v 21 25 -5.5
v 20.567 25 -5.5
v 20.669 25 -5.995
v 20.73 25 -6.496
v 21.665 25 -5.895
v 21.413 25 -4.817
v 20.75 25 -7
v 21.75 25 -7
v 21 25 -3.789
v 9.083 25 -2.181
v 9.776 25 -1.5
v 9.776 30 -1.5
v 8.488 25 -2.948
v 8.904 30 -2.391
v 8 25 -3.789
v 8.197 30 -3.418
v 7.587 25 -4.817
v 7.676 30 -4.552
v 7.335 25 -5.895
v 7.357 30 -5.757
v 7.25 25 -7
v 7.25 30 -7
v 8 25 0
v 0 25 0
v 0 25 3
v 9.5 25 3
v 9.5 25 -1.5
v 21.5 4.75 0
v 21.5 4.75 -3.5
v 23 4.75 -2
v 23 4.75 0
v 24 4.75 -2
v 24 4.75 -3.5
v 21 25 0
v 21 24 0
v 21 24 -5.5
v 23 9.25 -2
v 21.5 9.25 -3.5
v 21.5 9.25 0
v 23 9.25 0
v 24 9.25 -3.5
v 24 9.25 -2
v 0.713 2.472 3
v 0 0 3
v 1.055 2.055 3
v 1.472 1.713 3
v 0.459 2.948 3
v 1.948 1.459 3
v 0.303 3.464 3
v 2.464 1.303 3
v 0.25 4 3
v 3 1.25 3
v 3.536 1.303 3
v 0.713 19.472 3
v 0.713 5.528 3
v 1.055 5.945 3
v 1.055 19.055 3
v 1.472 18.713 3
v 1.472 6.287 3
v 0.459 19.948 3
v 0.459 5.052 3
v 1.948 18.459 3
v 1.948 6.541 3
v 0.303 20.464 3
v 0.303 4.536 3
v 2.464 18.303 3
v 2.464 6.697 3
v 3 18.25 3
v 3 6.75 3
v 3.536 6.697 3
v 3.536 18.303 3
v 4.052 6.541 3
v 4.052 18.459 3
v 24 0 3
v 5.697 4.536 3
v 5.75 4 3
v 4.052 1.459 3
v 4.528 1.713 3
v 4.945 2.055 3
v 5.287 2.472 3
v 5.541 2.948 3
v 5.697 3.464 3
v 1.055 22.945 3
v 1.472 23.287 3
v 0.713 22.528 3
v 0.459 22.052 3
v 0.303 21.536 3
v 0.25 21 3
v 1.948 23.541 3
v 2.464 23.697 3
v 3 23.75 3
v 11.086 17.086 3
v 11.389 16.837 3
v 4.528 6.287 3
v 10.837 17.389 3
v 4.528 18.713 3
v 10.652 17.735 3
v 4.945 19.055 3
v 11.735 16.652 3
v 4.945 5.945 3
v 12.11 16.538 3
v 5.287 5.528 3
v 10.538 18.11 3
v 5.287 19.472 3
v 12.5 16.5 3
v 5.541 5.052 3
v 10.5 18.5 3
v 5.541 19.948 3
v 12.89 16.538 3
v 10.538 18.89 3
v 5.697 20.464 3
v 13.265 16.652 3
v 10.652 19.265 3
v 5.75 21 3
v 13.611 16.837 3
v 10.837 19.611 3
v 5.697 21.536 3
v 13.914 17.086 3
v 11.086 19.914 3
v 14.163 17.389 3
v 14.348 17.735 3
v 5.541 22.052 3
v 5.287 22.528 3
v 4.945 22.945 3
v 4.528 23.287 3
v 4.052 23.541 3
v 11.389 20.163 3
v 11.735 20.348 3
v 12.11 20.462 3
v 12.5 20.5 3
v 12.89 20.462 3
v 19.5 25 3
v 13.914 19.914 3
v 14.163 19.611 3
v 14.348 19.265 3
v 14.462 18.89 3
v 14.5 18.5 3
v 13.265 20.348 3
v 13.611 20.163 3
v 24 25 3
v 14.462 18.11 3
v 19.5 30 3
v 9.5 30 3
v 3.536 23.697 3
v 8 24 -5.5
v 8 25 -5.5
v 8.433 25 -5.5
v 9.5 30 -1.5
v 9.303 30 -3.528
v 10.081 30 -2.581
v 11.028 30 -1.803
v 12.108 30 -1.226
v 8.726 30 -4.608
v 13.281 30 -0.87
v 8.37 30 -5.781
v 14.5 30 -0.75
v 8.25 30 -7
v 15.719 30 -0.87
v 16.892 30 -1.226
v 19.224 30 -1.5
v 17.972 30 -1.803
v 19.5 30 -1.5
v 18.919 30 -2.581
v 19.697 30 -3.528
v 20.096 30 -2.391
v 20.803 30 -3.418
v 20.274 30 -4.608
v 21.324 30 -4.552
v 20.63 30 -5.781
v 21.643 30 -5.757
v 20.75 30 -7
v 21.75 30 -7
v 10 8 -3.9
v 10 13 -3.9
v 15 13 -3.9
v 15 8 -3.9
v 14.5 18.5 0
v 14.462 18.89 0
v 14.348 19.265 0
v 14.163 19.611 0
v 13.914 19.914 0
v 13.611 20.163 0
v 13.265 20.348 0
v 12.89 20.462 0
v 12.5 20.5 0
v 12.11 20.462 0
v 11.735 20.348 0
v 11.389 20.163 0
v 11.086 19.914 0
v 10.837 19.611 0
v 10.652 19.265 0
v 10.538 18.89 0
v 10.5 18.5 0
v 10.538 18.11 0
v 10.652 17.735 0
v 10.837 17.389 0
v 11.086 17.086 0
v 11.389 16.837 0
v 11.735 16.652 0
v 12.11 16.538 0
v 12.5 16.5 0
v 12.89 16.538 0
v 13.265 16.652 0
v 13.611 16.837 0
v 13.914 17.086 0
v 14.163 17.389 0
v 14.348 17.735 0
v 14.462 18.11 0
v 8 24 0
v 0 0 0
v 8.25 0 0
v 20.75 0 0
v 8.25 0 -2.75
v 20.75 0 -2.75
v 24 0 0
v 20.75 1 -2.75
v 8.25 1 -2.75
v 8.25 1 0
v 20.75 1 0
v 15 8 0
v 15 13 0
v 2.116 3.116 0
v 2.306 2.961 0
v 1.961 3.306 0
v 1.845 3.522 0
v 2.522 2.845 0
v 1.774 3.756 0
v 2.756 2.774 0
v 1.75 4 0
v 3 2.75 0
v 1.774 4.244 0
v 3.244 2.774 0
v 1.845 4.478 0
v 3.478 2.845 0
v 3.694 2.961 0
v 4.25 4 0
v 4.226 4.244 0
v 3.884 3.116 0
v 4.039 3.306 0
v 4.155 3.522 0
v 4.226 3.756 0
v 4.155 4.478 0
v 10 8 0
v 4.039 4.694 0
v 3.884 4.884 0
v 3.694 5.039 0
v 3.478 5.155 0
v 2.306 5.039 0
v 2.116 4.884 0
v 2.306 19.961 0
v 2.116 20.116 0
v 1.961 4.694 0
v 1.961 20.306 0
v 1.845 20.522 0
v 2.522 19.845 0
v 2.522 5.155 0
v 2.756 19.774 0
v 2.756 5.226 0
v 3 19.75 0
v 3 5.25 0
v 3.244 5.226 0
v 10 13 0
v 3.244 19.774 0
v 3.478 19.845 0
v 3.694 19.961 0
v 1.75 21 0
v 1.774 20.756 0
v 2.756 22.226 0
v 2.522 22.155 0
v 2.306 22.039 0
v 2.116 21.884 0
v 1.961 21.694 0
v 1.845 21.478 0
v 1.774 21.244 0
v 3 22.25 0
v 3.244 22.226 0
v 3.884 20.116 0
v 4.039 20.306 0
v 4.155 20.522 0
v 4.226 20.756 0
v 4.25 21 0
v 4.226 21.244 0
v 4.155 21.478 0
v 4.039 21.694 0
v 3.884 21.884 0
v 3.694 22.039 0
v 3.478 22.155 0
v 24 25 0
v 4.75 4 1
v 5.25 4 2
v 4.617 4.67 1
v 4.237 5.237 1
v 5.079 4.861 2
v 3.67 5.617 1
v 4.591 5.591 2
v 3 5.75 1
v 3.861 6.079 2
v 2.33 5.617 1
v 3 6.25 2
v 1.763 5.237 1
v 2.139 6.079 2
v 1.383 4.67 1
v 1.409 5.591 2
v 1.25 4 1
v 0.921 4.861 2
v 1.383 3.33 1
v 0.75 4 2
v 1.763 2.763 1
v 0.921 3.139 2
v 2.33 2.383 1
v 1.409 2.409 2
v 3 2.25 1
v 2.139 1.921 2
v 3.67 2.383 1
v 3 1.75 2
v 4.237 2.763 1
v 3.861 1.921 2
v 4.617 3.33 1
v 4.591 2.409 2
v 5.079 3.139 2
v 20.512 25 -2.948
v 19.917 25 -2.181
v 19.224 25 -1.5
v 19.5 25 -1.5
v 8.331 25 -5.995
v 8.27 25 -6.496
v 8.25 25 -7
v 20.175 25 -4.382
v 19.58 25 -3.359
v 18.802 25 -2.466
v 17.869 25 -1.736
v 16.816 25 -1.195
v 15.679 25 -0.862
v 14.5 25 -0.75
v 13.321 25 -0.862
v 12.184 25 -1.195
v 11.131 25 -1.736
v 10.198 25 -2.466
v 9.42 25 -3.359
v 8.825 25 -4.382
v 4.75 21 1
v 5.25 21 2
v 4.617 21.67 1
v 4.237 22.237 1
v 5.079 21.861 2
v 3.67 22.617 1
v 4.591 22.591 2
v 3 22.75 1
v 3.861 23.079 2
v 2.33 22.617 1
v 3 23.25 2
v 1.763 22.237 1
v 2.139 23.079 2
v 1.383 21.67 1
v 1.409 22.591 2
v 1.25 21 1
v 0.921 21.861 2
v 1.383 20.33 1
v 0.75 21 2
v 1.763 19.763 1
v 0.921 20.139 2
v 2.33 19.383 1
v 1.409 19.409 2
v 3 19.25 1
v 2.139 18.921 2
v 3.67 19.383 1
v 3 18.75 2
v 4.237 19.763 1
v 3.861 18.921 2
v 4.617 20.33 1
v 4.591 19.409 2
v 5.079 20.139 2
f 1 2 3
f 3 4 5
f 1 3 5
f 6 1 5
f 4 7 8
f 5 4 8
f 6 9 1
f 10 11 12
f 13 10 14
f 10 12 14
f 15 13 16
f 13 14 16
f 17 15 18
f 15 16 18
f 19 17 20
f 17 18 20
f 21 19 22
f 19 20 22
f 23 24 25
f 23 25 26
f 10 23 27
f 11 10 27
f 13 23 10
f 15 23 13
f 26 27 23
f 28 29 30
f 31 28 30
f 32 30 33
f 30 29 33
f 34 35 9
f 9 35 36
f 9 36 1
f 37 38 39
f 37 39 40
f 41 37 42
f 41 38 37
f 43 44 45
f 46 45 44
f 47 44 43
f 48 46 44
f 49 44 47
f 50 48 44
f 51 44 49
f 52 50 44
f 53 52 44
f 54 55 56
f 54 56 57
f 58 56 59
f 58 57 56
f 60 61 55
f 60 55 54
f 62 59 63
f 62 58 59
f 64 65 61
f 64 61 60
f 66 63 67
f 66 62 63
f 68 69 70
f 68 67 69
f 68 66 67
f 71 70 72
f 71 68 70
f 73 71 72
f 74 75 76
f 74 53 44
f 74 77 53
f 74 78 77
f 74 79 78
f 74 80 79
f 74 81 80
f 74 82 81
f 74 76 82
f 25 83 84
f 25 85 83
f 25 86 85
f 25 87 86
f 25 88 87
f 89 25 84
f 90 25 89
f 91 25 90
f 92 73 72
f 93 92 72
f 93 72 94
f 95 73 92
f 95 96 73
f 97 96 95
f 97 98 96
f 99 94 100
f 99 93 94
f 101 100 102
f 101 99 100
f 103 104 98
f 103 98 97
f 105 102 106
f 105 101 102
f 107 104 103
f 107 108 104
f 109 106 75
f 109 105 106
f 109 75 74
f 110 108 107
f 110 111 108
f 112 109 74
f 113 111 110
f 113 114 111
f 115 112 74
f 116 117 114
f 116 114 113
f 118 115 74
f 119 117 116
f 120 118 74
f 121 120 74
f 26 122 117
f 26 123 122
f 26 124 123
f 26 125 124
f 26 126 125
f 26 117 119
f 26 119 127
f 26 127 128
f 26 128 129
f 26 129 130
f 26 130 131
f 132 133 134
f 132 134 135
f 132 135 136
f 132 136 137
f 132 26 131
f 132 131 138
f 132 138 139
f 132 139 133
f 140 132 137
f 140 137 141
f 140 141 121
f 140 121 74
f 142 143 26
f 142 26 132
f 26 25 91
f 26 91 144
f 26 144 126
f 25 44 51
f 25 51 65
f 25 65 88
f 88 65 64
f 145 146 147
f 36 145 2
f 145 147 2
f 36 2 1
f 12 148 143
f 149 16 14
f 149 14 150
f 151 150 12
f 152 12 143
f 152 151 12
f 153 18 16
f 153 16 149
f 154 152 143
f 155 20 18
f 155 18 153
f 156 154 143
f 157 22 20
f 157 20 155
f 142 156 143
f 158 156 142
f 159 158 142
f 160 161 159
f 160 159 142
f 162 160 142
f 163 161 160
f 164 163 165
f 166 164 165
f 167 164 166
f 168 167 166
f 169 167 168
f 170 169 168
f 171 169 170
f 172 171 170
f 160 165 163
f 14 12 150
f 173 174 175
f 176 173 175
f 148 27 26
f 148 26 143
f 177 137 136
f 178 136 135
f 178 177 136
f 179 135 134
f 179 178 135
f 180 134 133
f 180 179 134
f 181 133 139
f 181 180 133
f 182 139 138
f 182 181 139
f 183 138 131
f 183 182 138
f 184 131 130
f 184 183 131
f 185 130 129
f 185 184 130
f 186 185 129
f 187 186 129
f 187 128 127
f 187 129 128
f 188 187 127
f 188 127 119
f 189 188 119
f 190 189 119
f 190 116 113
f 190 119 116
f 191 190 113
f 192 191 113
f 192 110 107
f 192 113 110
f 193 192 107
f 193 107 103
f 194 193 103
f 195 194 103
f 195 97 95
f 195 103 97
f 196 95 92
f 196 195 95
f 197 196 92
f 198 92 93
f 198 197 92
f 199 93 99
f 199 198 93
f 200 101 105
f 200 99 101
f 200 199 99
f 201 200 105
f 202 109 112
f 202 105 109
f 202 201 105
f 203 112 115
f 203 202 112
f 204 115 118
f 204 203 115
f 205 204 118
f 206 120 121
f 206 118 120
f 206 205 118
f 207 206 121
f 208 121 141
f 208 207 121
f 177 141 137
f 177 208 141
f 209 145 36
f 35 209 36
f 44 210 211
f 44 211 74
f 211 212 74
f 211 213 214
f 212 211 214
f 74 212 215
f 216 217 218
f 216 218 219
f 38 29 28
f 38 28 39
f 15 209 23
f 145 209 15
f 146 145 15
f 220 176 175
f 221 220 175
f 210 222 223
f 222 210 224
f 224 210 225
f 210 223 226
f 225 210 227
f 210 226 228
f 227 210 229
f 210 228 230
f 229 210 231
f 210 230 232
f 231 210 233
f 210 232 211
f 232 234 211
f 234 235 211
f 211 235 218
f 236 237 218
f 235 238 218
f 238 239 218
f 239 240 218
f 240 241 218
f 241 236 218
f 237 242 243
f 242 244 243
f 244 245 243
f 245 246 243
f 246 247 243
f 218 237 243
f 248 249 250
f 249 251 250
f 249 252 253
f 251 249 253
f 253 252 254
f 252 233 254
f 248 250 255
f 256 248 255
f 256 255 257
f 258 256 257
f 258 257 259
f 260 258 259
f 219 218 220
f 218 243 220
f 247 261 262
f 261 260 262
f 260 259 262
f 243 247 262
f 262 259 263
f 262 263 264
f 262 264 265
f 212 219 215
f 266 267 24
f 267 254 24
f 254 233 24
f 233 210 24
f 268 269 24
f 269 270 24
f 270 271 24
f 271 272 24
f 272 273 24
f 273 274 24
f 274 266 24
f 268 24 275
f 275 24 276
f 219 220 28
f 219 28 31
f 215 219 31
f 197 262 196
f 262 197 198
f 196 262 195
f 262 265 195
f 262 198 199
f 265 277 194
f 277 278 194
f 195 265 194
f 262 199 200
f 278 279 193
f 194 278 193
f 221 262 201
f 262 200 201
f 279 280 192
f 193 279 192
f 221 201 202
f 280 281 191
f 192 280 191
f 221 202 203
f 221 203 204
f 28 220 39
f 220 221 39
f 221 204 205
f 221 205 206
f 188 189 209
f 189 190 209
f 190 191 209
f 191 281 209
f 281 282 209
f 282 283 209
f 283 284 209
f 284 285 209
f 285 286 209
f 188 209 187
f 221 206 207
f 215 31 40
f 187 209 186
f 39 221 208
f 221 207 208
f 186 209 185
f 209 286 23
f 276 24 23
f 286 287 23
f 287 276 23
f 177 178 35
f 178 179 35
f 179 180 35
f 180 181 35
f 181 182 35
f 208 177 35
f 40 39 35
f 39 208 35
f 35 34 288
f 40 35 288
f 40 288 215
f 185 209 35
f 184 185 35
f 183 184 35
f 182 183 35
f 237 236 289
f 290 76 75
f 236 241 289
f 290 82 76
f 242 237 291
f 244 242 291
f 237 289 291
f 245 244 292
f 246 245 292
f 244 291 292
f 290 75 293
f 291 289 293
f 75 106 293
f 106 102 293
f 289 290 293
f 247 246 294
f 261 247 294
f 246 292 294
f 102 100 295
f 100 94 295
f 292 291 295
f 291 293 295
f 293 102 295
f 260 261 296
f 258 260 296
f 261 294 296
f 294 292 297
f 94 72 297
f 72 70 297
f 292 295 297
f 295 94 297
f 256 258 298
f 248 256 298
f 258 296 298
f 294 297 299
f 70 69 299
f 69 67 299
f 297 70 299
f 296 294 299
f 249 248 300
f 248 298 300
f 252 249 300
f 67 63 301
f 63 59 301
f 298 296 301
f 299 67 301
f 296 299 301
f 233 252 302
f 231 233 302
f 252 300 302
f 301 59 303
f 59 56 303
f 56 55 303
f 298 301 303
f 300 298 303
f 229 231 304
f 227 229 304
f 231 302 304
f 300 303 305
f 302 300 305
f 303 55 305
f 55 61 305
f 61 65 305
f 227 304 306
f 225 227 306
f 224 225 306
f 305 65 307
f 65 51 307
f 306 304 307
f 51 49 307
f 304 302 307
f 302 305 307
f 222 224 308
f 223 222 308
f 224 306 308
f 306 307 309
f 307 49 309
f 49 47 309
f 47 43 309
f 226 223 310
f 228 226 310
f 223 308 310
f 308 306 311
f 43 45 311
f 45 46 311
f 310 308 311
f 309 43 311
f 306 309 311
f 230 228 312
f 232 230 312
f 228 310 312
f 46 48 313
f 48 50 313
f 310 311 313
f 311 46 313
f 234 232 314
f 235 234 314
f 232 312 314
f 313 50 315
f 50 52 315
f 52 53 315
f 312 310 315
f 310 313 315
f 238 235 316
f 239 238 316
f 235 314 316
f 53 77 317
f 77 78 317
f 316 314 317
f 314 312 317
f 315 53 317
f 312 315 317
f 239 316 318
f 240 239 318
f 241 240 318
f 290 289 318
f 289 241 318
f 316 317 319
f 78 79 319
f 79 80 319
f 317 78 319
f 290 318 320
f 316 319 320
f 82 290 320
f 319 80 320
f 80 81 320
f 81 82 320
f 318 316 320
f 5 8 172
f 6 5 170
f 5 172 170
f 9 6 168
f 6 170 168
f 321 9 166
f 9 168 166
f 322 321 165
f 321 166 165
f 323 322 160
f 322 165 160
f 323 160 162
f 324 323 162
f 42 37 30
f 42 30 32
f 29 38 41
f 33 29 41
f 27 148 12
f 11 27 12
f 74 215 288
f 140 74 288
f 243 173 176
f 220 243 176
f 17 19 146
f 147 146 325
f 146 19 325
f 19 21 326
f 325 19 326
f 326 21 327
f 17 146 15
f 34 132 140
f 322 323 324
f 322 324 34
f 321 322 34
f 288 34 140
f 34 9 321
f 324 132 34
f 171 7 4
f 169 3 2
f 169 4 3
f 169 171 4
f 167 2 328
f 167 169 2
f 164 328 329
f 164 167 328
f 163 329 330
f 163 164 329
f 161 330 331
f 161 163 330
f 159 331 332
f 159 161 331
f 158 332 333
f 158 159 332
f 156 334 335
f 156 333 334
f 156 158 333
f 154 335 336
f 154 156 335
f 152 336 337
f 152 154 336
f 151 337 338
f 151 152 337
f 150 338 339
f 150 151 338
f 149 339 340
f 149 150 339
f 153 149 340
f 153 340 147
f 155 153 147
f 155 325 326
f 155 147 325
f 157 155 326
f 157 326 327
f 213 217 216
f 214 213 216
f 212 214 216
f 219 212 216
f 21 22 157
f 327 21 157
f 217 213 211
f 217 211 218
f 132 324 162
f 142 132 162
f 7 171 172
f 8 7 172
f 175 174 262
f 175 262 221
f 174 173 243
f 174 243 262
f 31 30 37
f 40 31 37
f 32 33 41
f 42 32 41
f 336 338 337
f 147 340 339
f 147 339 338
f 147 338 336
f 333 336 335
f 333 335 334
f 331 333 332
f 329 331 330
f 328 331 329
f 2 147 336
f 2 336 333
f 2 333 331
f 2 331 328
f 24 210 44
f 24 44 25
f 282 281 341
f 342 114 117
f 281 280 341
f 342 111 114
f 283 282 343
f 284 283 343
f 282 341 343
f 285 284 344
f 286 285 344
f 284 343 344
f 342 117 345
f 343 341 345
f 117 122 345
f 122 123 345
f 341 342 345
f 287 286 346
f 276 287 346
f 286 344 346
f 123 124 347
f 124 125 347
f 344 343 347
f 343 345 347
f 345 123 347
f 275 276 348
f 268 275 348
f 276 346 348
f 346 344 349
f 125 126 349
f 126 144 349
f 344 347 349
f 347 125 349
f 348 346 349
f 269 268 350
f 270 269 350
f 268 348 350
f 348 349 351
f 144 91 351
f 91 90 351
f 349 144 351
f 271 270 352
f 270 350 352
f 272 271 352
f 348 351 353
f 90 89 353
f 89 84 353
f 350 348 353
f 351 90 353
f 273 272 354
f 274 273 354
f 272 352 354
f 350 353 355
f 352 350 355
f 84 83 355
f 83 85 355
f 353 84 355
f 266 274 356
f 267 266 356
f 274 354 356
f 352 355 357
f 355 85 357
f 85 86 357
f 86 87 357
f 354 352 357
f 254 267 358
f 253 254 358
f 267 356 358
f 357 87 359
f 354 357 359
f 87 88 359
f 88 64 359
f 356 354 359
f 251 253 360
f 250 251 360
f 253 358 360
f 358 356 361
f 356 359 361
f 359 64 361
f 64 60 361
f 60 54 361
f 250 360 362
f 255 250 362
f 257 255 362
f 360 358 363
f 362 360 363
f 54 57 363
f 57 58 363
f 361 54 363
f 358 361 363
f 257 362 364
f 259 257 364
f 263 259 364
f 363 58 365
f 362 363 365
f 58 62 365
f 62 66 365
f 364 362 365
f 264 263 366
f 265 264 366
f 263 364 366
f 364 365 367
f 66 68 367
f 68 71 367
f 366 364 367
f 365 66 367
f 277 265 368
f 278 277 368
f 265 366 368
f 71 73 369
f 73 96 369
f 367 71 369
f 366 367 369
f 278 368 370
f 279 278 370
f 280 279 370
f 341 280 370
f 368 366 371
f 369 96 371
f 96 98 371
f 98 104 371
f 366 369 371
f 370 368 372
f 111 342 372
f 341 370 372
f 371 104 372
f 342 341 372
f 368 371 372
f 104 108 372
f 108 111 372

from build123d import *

# Parameters (mm, degrees)
BOX006_W          = 5
BOX006_H          = 5
BOX006_DEPTH      = 3.9
CYLINDER003_R     = 2
CYLINDER003_DEPTH = 10
CYLINDER002_R     = 6.25
CYLINDER002_DEPTH = 10
BOX004_W          = 10
BOX004_H          = 5
BOX004_DEPTH      = 4.5
BOX003_W          = 20
BOX003_H          = 10
BOX003_DEPTH      = 10
CYLINDER001_R     = 6.25
CYLINDER001_DEPTH = 5
CYLINDER_R        = 7.25
CYLINDER_DEPTH    = 5
BOX_W             = 24
BOX_H             = 25
BOX_DEPTH         = 3
BOX001_W          = 1.5
BOX001_H          = 4.5
BOX001_DEPTH      = 5
BOX002_W          = 2.5
BOX002_H          = 4.5
BOX002_DEPTH      = 1.5
BOX005_W          = 13
BOX005_H          = 1
BOX005_DEPTH      = 5.5
BOX007_W          = 12.5
BOX007_H          = 1
BOX007_DEPTH      = 2.75


with BuildPart() as cube006:
    # Box006 → Box006 (new body)
    with BuildSketch(Plane(origin=(10, 8, -3.9), x_dir=(1, 0, 0), z_dir=(0, 0, 1))):
        with Locations((2.5, 2.5)):
            Rectangle(BOX006_W, BOX006_H)
    extrude(amount=BOX006_DEPTH)


with BuildPart() as cylinder003:
    # Cylinder003 → Cylinder003 (new body)
    with BuildSketch(Plane(origin=(12.5, 18.5, 0), x_dir=(1, 0, 0), z_dir=(0, 0, 1))):
        Circle(CYLINDER003_R)
    extrude(amount=CYLINDER003_DEPTH)


with BuildPart() as cylinder002:
    # Cylinder002 → Cylinder002 (new body)
    with BuildSketch(Plane(origin=(14.5, 30, -7), x_dir=(1, 0, 0), z_dir=(0, -1, 0))):
        Circle(CYLINDER002_R)
    extrude(amount=CYLINDER002_DEPTH)


with BuildPart() as cut004:
    # Box004 → Box004 (new body)
    with BuildSketch(Plane(origin=(9.5, 25, -1.5), x_dir=(1, 0, 0), z_dir=(0, 0, 1))):
        with Locations((5, 2.5)):
            Rectangle(BOX004_W, BOX004_H)
    extrude(amount=BOX004_DEPTH)

    # Cut004: cut Cylinder002
    add(cylinder002.part, mode=Mode.SUBTRACT)


with BuildPart() as cube003:
    # Box003 → Box003 (new body)
    with BuildSketch(Plane(origin=(5, 25, -17), x_dir=(1, 0, 0), z_dir=(0, 0, 1))):
        with Locations((10, 5)):
            Rectangle(BOX003_W, BOX003_H)
    extrude(amount=BOX003_DEPTH)


with BuildPart() as cylinder001:
    # Cylinder001 → Cylinder001 (new body)
    with BuildSketch(Plane(origin=(14.5, 30, -4.5), x_dir=(1, 0, 0), z_dir=(0, -1, 0))):
        Circle(CYLINDER001_R)
    extrude(amount=CYLINDER001_DEPTH)


with BuildPart() as fusion002:
    # Cylinder → Cylinder (new body)
    with BuildSketch(Plane(origin=(14.5, 30, -4.5), x_dir=(1, 0, 0), z_dir=(0, -1, 0))):
        Circle(CYLINDER_R)
    extrude(amount=CYLINDER_DEPTH)

    # Cut002: cut Cylinder001
    add(cylinder001.part, mode=Mode.SUBTRACT)


with BuildPart() as fusion002_1:
    # Cut002 placement: moved
    add(fusion002.part.moved(Location((0, 0, -2.5))))

    # Cut003: cut Cube003
    add(cube003.part, mode=Mode.SUBTRACT)

    # Fusion002: union Cut004
    add(cut004.part)


with BuildPart() as cone001:
    # Cone001 → Cone001 (revolve)
    with BuildSketch(Plane(origin=(3, 21, 0), x_dir=(1, 0, 0), z_dir=(0, -1, 0))):
        Polygon((0, 0), (1.25, 0), (2.75, 3), (0, 3), align=None)
    revolve(axis=Axis((3, 21, 0), (0, 0, 1)))


with BuildPart() as cone:
    # Cone → Cone (revolve)
    with BuildSketch(Plane(origin=(3, 4, 0), x_dir=(1, 0, 0), z_dir=(0, -1, 0))):
        Polygon((0, 0), (1.25, 0), (2.75, 3), (0, 3), align=None)
    revolve(axis=Axis((3, 4, 0), (0, 0, 1)))


with BuildPart() as cut001:
    # Box → Box (new body)
    with BuildSketch(Plane.XY):
        with Locations((12, 12.5)):
            Rectangle(BOX_W, BOX_H)
    extrude(amount=BOX_DEPTH)

    # Cut: cut Cone
    add(cone.part, mode=Mode.SUBTRACT)

    # Cut001: cut Cone001
    add(cone001.part, mode=Mode.SUBTRACT)


with BuildPart() as cube001:
    # Box001 → Box001 (new body)
    with BuildSketch(Plane(origin=(21.5, 4.75, -3.5), x_dir=(1, 0, 0), z_dir=(0, 0, 1))):
        with Locations((0.75, 2.25)):
            Rectangle(BOX001_W, BOX001_H)
    extrude(amount=BOX001_DEPTH)


with BuildPart() as fusion003:
    # Box002 → Box002 (new body)
    with BuildSketch(Plane(origin=(21.5, 4.75, -3.5), x_dir=(1, 0, 0), z_dir=(0, 0, 1))):
        with Locations((1.25, 2.25)):
            Rectangle(BOX002_W, BOX002_H)
    extrude(amount=BOX002_DEPTH)

    # Fusion: union Cube001
    add(cube001.part)

    # Fusion001: union Cut001
    add(cut001.part)

    # Fusion003: union Fusion002
    add(fusion002_1.part)


with BuildPart() as fusion005:
    # Box005 → Box005 (new body)
    with BuildSketch(Plane(origin=(8, 24, -5.5), x_dir=(1, 0, 0), z_dir=(0, 0, 1))):
        with Locations((6.5, 0.5)):
            Rectangle(BOX005_W, BOX005_H)
    extrude(amount=BOX005_DEPTH)

    # Fusion004: union Fusion003
    add(fusion003.part)

    # Cut005: cut Cylinder003
    add(cylinder003.part, mode=Mode.SUBTRACT)

    # Fusion005: union Cube006
    add(cube006.part)


with BuildPart() as fusion006:
    # Box007 → Box007 (new body)
    with BuildSketch(Plane(origin=(8.25, 0, -2.75), x_dir=(1, 0, 0), z_dir=(0, 0, 1))):
        with Locations((6.25, 0.5)):
            Rectangle(BOX007_W, BOX007_H)
    extrude(amount=BOX007_DEPTH)

    # Fusion006: union Fusion005
    add(fusion005.part)


solid = fusion006.part
